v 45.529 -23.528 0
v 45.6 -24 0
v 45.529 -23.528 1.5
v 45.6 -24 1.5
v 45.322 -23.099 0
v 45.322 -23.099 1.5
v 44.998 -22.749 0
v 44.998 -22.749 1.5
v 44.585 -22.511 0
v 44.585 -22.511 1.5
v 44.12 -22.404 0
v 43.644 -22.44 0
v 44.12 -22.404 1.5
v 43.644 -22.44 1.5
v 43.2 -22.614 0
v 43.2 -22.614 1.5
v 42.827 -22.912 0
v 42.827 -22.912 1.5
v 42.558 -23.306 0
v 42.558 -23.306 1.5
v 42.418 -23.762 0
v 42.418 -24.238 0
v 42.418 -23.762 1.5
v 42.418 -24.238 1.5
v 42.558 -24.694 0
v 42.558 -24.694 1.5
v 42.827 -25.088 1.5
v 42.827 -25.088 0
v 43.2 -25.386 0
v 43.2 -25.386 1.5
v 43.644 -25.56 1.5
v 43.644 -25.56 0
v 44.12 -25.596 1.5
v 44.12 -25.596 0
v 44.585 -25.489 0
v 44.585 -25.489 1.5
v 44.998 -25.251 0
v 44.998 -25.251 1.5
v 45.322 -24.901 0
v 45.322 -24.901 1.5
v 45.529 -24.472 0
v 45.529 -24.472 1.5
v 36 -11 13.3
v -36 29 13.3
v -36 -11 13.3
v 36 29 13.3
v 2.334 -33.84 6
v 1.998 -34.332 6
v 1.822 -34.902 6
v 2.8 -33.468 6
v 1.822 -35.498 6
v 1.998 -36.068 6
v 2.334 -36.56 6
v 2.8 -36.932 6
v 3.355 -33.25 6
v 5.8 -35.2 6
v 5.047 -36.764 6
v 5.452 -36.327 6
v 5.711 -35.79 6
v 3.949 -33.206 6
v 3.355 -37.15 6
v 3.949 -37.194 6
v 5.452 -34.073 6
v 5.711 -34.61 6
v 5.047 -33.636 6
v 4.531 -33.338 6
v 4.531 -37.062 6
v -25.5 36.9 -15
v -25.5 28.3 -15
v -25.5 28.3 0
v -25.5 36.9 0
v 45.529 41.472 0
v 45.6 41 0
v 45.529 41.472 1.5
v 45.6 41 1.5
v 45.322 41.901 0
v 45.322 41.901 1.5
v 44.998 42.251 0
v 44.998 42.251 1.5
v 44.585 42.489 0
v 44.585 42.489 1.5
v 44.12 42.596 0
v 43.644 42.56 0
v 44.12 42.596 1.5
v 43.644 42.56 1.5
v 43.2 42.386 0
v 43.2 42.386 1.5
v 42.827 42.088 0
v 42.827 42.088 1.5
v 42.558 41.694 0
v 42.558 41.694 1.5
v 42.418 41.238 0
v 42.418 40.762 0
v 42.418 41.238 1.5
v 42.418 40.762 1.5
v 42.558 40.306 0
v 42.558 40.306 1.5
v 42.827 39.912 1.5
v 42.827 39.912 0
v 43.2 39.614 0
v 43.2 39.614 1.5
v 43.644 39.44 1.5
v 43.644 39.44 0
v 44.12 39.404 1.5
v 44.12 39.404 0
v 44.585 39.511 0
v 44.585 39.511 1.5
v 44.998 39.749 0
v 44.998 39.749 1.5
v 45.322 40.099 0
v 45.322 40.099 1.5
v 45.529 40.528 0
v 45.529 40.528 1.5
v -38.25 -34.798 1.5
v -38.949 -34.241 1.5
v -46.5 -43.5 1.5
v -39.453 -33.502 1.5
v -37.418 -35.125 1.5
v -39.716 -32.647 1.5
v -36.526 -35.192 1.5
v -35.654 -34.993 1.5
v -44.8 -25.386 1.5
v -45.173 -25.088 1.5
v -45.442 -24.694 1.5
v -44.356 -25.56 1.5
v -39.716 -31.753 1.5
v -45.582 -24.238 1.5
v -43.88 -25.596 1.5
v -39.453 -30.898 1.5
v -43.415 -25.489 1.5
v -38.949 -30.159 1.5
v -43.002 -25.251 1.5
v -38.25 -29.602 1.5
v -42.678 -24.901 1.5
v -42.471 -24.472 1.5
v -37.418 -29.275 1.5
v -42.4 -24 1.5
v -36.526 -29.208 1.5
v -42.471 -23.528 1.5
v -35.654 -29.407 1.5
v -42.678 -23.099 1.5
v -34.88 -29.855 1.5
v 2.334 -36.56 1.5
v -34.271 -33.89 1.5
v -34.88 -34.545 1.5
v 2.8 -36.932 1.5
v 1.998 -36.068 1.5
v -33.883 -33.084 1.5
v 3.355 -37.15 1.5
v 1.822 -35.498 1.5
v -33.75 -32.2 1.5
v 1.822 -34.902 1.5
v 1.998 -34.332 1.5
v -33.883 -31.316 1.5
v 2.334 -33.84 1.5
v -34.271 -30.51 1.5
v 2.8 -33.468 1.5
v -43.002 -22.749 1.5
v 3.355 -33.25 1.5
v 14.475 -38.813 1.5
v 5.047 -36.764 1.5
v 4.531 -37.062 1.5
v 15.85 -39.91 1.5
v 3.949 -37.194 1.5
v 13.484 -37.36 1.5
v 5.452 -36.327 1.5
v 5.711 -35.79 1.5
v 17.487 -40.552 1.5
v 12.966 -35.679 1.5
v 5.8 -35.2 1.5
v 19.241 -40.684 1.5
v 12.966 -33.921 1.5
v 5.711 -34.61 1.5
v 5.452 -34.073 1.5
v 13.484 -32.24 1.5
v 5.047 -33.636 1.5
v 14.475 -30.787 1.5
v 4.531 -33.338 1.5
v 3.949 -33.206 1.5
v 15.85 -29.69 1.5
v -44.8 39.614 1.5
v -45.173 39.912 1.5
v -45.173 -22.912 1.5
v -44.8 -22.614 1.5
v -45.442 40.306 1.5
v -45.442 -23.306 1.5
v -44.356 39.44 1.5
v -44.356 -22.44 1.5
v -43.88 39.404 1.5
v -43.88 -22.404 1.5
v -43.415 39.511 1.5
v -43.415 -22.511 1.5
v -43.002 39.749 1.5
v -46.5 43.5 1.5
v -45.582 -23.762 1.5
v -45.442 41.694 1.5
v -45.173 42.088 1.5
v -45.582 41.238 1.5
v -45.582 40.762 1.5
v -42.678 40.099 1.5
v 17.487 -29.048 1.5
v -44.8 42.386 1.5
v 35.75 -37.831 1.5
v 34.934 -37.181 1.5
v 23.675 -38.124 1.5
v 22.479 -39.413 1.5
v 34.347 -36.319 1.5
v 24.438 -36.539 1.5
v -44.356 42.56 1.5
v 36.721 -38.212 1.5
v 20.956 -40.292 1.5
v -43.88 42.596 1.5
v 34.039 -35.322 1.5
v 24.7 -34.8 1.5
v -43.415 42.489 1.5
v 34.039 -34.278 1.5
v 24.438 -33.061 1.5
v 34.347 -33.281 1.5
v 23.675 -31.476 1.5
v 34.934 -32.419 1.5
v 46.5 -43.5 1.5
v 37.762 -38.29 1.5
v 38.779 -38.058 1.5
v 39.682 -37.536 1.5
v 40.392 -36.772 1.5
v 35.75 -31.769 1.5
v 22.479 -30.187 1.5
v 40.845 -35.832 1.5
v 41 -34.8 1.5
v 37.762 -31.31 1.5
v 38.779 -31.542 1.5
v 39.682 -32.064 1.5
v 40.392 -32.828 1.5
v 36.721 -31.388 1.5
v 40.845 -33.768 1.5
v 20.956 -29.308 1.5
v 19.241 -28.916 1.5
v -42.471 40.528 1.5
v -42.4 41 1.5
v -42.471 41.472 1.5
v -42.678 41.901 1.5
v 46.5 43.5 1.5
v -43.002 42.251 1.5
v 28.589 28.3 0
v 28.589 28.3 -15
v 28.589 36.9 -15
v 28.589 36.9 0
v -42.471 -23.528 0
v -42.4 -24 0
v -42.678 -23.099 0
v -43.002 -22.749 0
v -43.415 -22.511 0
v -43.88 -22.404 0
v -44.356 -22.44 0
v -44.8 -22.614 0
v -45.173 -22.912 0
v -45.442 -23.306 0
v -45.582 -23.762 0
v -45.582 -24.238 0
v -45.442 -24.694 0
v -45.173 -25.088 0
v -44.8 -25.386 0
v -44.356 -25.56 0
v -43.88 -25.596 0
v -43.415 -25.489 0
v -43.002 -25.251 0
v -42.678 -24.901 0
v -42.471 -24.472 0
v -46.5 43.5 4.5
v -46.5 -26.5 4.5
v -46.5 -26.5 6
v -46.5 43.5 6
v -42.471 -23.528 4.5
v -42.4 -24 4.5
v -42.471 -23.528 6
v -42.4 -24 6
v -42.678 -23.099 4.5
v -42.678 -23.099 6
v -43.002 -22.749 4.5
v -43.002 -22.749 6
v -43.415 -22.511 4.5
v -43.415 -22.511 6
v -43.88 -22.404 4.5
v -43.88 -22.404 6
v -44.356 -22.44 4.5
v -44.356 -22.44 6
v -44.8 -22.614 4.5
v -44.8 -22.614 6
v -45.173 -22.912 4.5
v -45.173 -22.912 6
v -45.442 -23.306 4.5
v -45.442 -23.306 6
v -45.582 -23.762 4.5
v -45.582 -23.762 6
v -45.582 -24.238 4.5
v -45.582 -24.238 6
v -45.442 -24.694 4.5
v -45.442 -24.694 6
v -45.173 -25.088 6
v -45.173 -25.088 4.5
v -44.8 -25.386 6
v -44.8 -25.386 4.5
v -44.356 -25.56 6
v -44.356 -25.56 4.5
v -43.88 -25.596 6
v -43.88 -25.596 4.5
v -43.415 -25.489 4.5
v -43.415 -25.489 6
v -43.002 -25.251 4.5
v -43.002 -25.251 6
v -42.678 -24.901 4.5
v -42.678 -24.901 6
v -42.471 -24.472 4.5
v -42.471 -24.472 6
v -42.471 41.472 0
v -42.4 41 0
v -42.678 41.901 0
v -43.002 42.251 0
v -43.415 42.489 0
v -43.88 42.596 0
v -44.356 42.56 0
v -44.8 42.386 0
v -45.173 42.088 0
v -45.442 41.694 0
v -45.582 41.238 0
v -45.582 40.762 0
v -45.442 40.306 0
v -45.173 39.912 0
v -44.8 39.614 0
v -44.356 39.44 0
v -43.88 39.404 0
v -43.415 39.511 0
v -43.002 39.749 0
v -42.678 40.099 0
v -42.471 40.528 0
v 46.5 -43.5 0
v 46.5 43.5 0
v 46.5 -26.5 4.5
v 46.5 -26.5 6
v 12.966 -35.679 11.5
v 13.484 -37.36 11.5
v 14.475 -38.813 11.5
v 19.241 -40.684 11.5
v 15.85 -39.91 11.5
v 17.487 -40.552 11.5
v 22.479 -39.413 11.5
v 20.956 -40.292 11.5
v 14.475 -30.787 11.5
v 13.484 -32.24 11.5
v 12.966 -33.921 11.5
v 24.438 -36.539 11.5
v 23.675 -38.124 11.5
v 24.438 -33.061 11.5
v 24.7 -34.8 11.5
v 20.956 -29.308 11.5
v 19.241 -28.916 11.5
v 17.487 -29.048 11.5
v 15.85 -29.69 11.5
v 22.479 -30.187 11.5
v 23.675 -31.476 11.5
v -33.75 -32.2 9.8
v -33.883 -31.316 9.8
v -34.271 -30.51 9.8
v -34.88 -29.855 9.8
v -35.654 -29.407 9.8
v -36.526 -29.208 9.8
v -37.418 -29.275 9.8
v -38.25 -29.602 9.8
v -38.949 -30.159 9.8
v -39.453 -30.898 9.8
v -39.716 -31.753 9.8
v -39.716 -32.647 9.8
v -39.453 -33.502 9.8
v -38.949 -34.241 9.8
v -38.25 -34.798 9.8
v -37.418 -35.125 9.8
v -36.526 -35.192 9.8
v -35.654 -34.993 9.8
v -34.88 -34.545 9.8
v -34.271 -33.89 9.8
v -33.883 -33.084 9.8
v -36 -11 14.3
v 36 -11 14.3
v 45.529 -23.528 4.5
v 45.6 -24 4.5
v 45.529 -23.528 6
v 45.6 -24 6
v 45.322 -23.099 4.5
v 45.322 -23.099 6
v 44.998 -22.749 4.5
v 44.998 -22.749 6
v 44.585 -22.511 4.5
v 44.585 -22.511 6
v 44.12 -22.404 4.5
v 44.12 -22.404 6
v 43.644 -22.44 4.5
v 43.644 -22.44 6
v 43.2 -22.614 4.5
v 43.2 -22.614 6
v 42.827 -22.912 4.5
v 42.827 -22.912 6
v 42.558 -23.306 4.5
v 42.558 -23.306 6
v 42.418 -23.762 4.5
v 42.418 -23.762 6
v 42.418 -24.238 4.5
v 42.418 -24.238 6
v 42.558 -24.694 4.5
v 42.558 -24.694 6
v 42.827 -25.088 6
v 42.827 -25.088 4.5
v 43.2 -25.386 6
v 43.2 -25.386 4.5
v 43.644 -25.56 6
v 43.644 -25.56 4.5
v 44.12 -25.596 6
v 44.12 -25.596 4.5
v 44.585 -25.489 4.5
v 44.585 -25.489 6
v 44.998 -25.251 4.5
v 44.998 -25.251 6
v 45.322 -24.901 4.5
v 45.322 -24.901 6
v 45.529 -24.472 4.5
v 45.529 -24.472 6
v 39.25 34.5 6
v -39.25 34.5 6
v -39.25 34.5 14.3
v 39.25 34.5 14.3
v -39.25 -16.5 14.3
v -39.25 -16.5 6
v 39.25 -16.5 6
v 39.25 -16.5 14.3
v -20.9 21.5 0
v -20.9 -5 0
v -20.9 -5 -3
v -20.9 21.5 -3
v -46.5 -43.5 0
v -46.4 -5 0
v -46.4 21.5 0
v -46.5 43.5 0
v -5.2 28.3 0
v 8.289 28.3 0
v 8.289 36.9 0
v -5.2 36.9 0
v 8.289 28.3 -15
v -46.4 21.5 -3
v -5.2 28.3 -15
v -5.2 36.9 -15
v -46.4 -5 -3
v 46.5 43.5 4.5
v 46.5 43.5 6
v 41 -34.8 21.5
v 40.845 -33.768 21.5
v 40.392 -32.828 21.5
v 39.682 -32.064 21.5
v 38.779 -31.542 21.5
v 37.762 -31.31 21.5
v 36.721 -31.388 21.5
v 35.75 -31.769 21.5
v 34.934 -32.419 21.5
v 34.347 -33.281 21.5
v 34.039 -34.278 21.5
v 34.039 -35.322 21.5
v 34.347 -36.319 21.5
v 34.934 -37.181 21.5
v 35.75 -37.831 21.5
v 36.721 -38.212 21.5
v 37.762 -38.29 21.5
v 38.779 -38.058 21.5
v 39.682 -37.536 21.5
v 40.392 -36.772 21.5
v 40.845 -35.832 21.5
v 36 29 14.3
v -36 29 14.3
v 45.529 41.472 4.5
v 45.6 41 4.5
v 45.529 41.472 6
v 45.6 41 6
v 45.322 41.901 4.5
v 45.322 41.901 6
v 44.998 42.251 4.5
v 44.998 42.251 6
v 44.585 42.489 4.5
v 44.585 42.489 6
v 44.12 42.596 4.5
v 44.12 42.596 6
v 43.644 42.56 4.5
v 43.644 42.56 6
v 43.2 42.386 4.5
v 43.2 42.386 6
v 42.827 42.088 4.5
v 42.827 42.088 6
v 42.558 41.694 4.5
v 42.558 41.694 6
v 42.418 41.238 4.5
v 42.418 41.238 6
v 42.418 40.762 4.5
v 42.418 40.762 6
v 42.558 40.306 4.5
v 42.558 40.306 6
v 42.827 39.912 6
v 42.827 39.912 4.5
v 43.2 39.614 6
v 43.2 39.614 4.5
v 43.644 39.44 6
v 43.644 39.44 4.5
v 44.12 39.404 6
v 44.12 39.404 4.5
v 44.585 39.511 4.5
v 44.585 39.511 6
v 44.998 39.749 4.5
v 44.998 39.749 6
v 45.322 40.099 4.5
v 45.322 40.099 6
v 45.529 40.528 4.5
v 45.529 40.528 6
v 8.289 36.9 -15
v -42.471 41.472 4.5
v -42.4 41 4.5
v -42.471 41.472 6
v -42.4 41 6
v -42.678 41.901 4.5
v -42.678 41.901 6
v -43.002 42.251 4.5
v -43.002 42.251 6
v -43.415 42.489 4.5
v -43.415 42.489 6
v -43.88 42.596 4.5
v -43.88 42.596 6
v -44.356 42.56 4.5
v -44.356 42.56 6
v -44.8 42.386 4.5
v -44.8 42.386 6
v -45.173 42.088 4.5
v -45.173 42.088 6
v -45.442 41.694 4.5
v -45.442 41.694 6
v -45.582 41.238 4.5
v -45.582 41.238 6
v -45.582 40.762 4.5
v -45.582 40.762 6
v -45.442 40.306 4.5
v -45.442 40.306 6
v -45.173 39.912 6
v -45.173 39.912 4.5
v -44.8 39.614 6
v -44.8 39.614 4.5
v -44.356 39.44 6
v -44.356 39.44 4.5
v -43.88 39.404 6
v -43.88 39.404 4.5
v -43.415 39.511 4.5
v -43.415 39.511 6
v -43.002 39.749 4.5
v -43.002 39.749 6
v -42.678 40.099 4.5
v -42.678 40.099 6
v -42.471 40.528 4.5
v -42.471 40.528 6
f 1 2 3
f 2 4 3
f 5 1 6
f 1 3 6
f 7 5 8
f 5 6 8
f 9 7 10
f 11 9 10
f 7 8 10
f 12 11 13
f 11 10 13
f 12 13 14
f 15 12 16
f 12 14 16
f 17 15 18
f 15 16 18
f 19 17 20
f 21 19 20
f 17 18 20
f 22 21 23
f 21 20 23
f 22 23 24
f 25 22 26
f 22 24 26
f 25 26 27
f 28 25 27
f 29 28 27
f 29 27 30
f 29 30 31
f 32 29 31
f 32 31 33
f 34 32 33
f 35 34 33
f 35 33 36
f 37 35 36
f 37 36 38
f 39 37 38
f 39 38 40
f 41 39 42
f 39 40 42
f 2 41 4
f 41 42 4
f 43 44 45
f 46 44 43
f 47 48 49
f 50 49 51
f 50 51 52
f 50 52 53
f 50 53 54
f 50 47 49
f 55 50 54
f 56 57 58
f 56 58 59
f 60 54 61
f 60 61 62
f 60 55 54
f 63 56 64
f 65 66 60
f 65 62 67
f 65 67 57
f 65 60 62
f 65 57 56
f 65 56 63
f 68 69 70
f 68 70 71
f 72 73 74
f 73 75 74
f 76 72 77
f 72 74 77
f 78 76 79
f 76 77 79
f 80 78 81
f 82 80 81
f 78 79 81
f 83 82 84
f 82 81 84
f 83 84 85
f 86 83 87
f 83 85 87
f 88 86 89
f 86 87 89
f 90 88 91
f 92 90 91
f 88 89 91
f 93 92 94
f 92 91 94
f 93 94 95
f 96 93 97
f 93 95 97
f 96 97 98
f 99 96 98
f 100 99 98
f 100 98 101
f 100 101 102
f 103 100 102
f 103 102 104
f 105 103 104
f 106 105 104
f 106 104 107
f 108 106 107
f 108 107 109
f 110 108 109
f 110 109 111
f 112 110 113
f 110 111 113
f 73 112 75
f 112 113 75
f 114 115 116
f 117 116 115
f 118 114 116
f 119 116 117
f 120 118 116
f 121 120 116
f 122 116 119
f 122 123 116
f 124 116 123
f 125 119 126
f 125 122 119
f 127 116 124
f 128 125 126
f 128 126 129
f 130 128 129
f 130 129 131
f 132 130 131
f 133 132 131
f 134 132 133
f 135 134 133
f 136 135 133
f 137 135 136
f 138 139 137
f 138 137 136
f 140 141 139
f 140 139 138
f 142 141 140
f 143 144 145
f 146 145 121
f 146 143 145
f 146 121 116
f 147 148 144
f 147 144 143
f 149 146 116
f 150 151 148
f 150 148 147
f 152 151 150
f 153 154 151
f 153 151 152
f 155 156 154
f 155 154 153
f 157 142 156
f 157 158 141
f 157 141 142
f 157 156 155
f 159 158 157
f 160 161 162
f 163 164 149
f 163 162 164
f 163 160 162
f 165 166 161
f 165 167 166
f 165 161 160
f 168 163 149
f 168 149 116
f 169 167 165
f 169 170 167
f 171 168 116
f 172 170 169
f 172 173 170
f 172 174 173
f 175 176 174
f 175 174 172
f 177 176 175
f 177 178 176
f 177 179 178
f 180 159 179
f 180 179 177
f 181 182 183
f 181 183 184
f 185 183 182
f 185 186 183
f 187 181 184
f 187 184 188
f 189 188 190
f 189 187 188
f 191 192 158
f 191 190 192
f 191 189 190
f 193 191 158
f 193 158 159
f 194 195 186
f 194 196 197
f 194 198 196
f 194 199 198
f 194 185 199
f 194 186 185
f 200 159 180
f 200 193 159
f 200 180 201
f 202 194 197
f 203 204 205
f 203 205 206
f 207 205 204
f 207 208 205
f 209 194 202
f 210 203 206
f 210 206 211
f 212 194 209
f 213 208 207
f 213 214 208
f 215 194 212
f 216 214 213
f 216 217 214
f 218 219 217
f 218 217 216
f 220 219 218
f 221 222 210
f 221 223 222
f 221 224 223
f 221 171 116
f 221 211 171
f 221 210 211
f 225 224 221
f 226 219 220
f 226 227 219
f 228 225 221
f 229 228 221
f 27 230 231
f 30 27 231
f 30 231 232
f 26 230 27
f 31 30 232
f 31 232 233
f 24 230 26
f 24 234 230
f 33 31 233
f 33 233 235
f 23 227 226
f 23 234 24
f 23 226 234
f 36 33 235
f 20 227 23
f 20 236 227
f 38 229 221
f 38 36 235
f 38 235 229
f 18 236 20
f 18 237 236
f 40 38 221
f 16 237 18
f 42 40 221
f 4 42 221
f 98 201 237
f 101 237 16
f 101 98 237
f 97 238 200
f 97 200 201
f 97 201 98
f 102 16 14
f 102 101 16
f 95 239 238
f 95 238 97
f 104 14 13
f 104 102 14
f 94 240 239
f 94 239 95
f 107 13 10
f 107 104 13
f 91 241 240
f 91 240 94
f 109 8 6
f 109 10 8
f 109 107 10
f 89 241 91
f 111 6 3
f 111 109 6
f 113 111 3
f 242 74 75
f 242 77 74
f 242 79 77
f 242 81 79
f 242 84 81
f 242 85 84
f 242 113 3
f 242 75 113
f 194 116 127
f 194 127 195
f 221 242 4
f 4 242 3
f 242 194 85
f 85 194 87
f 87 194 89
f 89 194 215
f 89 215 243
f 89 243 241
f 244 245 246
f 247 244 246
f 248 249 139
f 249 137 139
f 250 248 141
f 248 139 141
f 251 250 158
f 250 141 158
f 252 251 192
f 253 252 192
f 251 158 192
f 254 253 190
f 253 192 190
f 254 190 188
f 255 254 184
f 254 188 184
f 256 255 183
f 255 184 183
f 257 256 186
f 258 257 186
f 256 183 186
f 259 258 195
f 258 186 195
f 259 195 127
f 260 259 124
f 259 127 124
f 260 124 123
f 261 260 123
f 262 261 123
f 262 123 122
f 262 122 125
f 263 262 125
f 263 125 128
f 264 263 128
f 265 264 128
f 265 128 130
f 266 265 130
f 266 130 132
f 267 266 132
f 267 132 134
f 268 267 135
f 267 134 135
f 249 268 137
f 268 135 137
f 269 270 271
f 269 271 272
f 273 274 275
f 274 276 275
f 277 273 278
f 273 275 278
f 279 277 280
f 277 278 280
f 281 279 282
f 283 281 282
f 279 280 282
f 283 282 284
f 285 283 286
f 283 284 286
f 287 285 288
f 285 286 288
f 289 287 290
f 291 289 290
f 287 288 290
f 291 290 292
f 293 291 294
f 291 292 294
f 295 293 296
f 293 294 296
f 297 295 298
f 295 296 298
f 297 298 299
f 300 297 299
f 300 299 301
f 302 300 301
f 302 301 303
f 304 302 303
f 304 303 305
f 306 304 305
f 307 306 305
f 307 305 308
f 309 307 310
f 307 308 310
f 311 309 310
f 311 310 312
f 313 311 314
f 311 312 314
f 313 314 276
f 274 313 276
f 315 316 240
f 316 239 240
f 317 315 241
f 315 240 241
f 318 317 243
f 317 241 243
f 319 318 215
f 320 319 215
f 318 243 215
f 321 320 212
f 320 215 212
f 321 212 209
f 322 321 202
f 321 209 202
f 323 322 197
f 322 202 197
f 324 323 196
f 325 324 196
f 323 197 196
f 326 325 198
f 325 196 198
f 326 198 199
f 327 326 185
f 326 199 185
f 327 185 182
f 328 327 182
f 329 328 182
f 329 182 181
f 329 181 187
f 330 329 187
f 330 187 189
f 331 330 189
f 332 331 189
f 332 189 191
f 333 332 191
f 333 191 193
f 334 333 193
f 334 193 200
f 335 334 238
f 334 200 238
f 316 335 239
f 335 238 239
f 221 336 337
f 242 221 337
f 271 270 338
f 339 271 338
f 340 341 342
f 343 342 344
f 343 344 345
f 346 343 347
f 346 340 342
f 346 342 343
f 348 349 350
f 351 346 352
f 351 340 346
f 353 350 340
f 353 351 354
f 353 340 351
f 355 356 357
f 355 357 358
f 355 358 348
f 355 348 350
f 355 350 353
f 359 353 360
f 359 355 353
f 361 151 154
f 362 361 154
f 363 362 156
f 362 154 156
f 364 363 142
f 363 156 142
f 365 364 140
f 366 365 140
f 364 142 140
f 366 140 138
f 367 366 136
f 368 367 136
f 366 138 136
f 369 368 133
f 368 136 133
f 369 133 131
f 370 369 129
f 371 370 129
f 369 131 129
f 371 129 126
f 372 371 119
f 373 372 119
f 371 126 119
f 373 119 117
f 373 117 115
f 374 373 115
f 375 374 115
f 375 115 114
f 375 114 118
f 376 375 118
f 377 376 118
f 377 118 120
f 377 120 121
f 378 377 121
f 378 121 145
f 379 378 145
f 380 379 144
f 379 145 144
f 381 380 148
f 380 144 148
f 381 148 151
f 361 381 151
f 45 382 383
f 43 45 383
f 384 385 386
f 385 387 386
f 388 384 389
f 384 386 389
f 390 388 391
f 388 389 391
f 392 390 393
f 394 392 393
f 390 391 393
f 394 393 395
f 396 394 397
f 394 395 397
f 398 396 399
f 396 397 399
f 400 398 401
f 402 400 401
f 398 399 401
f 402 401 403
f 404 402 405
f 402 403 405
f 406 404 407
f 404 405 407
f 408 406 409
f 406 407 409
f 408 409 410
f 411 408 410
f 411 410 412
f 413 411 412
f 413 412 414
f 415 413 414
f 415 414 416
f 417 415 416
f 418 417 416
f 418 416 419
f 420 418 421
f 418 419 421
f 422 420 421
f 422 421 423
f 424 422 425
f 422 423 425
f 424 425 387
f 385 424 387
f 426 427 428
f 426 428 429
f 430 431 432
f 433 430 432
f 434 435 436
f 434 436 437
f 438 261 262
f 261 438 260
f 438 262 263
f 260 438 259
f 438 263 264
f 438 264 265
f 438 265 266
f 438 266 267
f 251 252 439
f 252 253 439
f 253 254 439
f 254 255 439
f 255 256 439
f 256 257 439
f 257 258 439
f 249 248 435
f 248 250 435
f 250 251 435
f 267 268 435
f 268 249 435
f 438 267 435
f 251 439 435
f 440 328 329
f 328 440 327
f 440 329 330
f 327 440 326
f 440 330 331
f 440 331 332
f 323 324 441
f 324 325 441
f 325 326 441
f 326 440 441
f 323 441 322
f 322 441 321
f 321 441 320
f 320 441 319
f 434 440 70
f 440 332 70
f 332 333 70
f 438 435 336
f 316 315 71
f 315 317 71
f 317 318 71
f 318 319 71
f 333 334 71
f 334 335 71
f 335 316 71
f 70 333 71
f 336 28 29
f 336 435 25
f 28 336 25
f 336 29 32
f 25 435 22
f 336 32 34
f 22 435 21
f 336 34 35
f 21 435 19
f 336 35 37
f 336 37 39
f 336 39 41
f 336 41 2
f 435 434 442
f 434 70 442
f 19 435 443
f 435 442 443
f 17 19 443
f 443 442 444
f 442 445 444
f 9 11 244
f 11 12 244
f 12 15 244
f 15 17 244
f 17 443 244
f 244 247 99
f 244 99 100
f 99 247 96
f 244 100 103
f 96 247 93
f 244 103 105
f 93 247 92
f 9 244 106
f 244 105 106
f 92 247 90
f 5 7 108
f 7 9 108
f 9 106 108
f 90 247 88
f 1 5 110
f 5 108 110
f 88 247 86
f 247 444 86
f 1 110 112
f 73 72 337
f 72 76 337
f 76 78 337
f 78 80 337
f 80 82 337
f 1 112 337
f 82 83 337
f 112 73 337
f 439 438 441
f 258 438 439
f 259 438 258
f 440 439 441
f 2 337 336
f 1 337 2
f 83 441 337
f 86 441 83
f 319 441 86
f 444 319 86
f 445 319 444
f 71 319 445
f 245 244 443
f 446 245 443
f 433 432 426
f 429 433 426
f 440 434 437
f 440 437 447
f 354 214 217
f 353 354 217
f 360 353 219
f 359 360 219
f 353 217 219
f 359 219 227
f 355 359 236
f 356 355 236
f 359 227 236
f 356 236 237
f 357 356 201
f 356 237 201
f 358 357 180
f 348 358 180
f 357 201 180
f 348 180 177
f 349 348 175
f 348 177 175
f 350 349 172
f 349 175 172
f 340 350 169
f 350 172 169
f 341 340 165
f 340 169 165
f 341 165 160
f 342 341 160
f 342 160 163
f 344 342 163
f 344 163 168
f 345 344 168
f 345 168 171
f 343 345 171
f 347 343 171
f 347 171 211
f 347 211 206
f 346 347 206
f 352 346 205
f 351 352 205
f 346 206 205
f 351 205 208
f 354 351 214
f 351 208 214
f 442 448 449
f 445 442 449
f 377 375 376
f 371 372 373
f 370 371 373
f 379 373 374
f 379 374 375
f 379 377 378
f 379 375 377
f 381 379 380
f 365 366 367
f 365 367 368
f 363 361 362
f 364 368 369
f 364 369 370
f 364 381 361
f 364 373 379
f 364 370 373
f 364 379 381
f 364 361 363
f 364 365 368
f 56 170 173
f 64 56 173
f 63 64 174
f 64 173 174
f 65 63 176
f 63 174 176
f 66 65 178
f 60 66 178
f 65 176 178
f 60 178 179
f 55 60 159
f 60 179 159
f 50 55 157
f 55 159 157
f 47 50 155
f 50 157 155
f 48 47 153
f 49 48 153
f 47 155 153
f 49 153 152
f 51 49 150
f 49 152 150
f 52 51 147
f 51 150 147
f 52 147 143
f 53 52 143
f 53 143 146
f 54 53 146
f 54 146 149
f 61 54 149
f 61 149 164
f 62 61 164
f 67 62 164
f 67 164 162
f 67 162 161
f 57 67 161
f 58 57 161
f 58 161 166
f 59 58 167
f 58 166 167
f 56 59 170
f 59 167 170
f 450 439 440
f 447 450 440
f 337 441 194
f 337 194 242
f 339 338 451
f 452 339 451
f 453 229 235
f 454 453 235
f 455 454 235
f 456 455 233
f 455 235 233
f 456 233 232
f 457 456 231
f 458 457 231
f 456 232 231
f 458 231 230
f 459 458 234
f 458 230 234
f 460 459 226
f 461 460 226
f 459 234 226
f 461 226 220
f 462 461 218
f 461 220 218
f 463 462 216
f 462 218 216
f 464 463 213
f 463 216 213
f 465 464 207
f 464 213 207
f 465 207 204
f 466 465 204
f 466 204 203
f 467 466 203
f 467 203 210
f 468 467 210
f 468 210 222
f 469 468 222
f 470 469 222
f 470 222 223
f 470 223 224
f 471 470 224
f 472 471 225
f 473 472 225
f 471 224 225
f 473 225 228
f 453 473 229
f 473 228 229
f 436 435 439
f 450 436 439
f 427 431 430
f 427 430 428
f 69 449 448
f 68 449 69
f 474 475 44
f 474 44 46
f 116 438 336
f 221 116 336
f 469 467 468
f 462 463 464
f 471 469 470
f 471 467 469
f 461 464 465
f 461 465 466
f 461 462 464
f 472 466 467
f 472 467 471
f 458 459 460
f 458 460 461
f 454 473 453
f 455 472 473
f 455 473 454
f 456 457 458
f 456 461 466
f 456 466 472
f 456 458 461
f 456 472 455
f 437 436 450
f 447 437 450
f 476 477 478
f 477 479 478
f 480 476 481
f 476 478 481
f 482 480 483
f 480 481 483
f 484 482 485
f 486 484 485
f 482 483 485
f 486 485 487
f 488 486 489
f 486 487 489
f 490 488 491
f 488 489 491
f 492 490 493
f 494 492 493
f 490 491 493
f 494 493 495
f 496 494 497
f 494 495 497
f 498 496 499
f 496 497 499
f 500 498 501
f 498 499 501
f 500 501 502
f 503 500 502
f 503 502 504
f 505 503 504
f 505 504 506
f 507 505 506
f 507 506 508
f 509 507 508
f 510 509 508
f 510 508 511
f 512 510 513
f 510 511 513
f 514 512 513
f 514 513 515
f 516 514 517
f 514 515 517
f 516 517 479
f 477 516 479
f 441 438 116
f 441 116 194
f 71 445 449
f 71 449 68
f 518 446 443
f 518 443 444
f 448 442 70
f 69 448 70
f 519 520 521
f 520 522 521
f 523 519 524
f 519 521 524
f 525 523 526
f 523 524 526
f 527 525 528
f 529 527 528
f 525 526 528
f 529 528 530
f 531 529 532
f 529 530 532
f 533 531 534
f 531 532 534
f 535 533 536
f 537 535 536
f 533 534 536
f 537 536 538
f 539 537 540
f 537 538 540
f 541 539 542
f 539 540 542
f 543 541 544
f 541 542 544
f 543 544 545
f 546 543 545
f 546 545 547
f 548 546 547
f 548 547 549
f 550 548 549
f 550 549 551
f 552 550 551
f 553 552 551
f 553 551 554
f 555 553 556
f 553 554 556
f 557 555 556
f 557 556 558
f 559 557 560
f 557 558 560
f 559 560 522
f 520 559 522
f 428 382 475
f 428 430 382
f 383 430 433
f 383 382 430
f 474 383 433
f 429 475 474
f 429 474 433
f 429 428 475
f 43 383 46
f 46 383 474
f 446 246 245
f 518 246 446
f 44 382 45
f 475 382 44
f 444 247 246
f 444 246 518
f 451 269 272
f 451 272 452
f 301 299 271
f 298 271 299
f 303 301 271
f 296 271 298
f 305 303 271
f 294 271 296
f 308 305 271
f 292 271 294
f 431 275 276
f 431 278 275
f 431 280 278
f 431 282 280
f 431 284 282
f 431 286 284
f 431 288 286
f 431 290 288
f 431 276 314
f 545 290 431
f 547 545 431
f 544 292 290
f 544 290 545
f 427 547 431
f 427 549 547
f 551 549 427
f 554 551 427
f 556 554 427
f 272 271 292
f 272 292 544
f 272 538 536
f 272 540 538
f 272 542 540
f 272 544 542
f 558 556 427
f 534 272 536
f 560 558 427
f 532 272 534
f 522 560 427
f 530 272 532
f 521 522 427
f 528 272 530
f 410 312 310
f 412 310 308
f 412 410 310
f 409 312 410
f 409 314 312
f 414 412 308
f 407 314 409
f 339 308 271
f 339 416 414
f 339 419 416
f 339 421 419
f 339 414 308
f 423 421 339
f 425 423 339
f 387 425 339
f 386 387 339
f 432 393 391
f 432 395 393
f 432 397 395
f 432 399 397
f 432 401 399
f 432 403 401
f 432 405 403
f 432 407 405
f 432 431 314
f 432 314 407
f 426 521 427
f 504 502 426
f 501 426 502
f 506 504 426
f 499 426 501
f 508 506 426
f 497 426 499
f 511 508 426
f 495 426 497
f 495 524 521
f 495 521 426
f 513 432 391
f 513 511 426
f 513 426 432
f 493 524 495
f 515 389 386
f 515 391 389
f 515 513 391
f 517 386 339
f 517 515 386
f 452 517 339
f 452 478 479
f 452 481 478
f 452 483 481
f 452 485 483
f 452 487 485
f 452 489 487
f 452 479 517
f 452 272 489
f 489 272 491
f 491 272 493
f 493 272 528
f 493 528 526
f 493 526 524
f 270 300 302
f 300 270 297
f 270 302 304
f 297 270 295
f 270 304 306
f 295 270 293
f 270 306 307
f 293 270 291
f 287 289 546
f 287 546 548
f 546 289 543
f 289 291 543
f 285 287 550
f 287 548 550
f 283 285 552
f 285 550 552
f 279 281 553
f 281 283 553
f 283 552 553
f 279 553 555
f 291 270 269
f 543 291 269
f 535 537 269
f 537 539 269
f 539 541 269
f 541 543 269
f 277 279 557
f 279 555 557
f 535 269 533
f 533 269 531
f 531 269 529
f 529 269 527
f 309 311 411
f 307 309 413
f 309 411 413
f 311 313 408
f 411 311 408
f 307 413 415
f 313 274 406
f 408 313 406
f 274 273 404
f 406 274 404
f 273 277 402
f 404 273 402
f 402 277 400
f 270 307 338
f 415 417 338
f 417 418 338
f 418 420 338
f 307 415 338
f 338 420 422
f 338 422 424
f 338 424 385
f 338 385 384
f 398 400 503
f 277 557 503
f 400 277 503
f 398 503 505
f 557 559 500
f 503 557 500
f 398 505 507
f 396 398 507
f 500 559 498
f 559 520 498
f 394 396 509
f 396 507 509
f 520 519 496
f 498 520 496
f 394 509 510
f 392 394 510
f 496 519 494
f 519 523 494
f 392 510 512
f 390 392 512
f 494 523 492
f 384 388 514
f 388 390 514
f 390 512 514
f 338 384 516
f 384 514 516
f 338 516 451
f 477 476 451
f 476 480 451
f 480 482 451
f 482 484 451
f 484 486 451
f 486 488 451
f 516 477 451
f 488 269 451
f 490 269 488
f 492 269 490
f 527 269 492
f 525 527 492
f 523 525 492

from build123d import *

# Parameters (mm, degrees)
ESBO_O1_W                  = 93
ESBO_O1_H                  = 87
RESSALTO_EXTRUS_O1_DEPTH   = 1.5
RESSALTO_EXTRUS_O2_START   = 3
ESBO_O3_W                  = 93
ESBO_O3_H                  = 70
RESSALTO_EXTRUS_O2_DEPTH   = 1.5
ESBO_O4_W                  = 78.5
ESBO_O4_H                  = 51
RESSALTO_EXTRUS_O3_DEPTH   = 8.3
ESBO_O5_W                  = 72
ESBO_O5_H                  = 40
CORTE_EXTRUS_O1_DEPTH      = 1
ESBO_O6_R                  = 3.5
RESSALTO_EXTRUS_O4_DEPTH   = 20
ESBO_O7_R                  = 2
RESSALTO_EXTRUS_O5_DEPTH   = 4.5
ESBO_O8_R                  = 5.9
RESSALTO_EXTRUS_O6_DEPTH   = 10
ESBO_O9_R                  = 3
RESSALTO_EXTRUS_O7_DEPTH   = 8.3
ESBO_O10_R                 = 1.6
CORTE_EXTRUS_O2_DEPTH      = 16.5
CORTE_EXTRUS_O2_DEPTH_BACK = 7
ESBO_O11_W                 = 20.3
ESBO_O11_H                 = 8.6
RESSALTO_EXTRUS_O8_DEPTH   = 15
ESBO_O12_W                 = 25.5
ESBO_O12_H                 = 26.5
RESSALTO_EXTRUS_O9_DEPTH   = 3


with BuildPart() as part:
    # Esboço1 → Ressalto-extrusão1 (new body)
    with BuildSketch(Plane.XY):
        Rectangle(ESBO_O1_W, ESBO_O1_H)
    extrude(amount=RESSALTO_EXTRUS_O1_DEPTH)

    # Esboço6 → Ressalto-extrusão4 (add)
    with BuildSketch(Plane.XY.offset(1.5)):
        with Locations((37.5, -34.8)):
            Circle(ESBO_O6_R)
    extrude(amount=RESSALTO_EXTRUS_O4_DEPTH)

    # Esboço7 → Ressalto-extrusão5 (add)
    with BuildSketch(Plane.XY.offset(1.5)):
        with Locations((3.8, -35.2)):
            Circle(ESBO_O7_R)
    extrude(amount=RESSALTO_EXTRUS_O5_DEPTH)

    # Esboço8 → Ressalto-extrusão6 (add)
    with BuildSketch(Plane.XY.offset(1.5)):
        with Locations((18.8, -34.8)):
            Circle(ESBO_O8_R)
    extrude(amount=RESSALTO_EXTRUS_O6_DEPTH)

    # Esboço9 → Ressalto-extrusão7 (add)
    with BuildSketch(Plane.XY.offset(1.5)):
        with Locations((-36.75, -32.2)):
            Circle(ESBO_O9_R)
    extrude(amount=RESSALTO_EXTRUS_O7_DEPTH)


with BuildPart() as body_2:
    # Esboço3 → Ressalto-extrusão2 (new body)
    with BuildSketch(Plane.XY.offset(1.5).offset(RESSALTO_EXTRUS_O2_START)):
        with Locations((0, 8.5)):
            Rectangle(ESBO_O3_W, ESBO_O3_H)
    extrude(amount=RESSALTO_EXTRUS_O2_DEPTH)

    # Esboço4 → Ressalto-extrusão3 (add)
    with BuildSketch(Plane.XY.offset(6)):
        with Locations((0, 9)):
            Rectangle(ESBO_O4_W, ESBO_O4_H)
    extrude(amount=RESSALTO_EXTRUS_O3_DEPTH)

    # Esboço5 → Corte-extrusão1 (cut)
    with BuildSketch(Plane.XY.offset(14.3)):
        with Locations((0, 9)):
            Rectangle(ESBO_O5_W, ESBO_O5_H)
    extrude(amount=-CORTE_EXTRUS_O1_DEPTH, mode=Mode.SUBTRACT)


with BuildPart() as corte_extrus_o2_tool:
    # Esboço10 → Corte-extrusão2 (new body, two sides)
    with BuildSketch(Plane.XY.offset(6)) as corte_extrus_o2_sk:
        with Locations((-44, 41)):
            Circle(ESBO_O10_R)
        with Locations((44, 41)):
            Circle(ESBO_O10_R)
        with Locations((44, -24)):
            Circle(ESBO_O10_R)
        with Locations((-44, -24)):
            Circle(ESBO_O10_R)
    extrude(amount=CORTE_EXTRUS_O2_DEPTH)
    extrude(corte_extrus_o2_sk.sketch, amount=-CORTE_EXTRUS_O2_DEPTH_BACK)


with BuildPart() as part_1:
    add(part.part)

    # Corte-extrusão2: cut by corte_extrus_o2_tool
    add(corte_extrus_o2_tool.part, mode=Mode.SUBTRACT)

    # Esboço11 → Ressalto-extrusão8 (add)
    with BuildSketch(Plane(origin=(0, 0, 0), x_dir=(-1, 0, 0), z_dir=(0, 0, -1))):
        with Locations((-18.438731824, 32.6)):
            Rectangle(ESBO_O11_W, ESBO_O11_H)
        with Locations((15.35, 32.6)):
            Rectangle(ESBO_O11_W, ESBO_O11_H)
    extrude(amount=RESSALTO_EXTRUS_O8_DEPTH)

    # Esboço12 → Ressalto-extrusão9 (add)
    with BuildSketch(Plane(origin=(0, 0, 0), x_dir=(-1, 0, 0), z_dir=(0, 0, -1))):
        with Locations((33.65, 8.25)):
            Rectangle(ESBO_O12_W, ESBO_O12_H)
    extrude(amount=RESSALTO_EXTRUS_O9_DEPTH)


with BuildPart() as body_2_1:
    add(body_2.part)

    # Corte-extrusão2: cut by corte_extrus_o2_tool
    add(corte_extrus_o2_tool.part, mode=Mode.SUBTRACT)


solid = Compound([part_1.part, body_2_1.part])
